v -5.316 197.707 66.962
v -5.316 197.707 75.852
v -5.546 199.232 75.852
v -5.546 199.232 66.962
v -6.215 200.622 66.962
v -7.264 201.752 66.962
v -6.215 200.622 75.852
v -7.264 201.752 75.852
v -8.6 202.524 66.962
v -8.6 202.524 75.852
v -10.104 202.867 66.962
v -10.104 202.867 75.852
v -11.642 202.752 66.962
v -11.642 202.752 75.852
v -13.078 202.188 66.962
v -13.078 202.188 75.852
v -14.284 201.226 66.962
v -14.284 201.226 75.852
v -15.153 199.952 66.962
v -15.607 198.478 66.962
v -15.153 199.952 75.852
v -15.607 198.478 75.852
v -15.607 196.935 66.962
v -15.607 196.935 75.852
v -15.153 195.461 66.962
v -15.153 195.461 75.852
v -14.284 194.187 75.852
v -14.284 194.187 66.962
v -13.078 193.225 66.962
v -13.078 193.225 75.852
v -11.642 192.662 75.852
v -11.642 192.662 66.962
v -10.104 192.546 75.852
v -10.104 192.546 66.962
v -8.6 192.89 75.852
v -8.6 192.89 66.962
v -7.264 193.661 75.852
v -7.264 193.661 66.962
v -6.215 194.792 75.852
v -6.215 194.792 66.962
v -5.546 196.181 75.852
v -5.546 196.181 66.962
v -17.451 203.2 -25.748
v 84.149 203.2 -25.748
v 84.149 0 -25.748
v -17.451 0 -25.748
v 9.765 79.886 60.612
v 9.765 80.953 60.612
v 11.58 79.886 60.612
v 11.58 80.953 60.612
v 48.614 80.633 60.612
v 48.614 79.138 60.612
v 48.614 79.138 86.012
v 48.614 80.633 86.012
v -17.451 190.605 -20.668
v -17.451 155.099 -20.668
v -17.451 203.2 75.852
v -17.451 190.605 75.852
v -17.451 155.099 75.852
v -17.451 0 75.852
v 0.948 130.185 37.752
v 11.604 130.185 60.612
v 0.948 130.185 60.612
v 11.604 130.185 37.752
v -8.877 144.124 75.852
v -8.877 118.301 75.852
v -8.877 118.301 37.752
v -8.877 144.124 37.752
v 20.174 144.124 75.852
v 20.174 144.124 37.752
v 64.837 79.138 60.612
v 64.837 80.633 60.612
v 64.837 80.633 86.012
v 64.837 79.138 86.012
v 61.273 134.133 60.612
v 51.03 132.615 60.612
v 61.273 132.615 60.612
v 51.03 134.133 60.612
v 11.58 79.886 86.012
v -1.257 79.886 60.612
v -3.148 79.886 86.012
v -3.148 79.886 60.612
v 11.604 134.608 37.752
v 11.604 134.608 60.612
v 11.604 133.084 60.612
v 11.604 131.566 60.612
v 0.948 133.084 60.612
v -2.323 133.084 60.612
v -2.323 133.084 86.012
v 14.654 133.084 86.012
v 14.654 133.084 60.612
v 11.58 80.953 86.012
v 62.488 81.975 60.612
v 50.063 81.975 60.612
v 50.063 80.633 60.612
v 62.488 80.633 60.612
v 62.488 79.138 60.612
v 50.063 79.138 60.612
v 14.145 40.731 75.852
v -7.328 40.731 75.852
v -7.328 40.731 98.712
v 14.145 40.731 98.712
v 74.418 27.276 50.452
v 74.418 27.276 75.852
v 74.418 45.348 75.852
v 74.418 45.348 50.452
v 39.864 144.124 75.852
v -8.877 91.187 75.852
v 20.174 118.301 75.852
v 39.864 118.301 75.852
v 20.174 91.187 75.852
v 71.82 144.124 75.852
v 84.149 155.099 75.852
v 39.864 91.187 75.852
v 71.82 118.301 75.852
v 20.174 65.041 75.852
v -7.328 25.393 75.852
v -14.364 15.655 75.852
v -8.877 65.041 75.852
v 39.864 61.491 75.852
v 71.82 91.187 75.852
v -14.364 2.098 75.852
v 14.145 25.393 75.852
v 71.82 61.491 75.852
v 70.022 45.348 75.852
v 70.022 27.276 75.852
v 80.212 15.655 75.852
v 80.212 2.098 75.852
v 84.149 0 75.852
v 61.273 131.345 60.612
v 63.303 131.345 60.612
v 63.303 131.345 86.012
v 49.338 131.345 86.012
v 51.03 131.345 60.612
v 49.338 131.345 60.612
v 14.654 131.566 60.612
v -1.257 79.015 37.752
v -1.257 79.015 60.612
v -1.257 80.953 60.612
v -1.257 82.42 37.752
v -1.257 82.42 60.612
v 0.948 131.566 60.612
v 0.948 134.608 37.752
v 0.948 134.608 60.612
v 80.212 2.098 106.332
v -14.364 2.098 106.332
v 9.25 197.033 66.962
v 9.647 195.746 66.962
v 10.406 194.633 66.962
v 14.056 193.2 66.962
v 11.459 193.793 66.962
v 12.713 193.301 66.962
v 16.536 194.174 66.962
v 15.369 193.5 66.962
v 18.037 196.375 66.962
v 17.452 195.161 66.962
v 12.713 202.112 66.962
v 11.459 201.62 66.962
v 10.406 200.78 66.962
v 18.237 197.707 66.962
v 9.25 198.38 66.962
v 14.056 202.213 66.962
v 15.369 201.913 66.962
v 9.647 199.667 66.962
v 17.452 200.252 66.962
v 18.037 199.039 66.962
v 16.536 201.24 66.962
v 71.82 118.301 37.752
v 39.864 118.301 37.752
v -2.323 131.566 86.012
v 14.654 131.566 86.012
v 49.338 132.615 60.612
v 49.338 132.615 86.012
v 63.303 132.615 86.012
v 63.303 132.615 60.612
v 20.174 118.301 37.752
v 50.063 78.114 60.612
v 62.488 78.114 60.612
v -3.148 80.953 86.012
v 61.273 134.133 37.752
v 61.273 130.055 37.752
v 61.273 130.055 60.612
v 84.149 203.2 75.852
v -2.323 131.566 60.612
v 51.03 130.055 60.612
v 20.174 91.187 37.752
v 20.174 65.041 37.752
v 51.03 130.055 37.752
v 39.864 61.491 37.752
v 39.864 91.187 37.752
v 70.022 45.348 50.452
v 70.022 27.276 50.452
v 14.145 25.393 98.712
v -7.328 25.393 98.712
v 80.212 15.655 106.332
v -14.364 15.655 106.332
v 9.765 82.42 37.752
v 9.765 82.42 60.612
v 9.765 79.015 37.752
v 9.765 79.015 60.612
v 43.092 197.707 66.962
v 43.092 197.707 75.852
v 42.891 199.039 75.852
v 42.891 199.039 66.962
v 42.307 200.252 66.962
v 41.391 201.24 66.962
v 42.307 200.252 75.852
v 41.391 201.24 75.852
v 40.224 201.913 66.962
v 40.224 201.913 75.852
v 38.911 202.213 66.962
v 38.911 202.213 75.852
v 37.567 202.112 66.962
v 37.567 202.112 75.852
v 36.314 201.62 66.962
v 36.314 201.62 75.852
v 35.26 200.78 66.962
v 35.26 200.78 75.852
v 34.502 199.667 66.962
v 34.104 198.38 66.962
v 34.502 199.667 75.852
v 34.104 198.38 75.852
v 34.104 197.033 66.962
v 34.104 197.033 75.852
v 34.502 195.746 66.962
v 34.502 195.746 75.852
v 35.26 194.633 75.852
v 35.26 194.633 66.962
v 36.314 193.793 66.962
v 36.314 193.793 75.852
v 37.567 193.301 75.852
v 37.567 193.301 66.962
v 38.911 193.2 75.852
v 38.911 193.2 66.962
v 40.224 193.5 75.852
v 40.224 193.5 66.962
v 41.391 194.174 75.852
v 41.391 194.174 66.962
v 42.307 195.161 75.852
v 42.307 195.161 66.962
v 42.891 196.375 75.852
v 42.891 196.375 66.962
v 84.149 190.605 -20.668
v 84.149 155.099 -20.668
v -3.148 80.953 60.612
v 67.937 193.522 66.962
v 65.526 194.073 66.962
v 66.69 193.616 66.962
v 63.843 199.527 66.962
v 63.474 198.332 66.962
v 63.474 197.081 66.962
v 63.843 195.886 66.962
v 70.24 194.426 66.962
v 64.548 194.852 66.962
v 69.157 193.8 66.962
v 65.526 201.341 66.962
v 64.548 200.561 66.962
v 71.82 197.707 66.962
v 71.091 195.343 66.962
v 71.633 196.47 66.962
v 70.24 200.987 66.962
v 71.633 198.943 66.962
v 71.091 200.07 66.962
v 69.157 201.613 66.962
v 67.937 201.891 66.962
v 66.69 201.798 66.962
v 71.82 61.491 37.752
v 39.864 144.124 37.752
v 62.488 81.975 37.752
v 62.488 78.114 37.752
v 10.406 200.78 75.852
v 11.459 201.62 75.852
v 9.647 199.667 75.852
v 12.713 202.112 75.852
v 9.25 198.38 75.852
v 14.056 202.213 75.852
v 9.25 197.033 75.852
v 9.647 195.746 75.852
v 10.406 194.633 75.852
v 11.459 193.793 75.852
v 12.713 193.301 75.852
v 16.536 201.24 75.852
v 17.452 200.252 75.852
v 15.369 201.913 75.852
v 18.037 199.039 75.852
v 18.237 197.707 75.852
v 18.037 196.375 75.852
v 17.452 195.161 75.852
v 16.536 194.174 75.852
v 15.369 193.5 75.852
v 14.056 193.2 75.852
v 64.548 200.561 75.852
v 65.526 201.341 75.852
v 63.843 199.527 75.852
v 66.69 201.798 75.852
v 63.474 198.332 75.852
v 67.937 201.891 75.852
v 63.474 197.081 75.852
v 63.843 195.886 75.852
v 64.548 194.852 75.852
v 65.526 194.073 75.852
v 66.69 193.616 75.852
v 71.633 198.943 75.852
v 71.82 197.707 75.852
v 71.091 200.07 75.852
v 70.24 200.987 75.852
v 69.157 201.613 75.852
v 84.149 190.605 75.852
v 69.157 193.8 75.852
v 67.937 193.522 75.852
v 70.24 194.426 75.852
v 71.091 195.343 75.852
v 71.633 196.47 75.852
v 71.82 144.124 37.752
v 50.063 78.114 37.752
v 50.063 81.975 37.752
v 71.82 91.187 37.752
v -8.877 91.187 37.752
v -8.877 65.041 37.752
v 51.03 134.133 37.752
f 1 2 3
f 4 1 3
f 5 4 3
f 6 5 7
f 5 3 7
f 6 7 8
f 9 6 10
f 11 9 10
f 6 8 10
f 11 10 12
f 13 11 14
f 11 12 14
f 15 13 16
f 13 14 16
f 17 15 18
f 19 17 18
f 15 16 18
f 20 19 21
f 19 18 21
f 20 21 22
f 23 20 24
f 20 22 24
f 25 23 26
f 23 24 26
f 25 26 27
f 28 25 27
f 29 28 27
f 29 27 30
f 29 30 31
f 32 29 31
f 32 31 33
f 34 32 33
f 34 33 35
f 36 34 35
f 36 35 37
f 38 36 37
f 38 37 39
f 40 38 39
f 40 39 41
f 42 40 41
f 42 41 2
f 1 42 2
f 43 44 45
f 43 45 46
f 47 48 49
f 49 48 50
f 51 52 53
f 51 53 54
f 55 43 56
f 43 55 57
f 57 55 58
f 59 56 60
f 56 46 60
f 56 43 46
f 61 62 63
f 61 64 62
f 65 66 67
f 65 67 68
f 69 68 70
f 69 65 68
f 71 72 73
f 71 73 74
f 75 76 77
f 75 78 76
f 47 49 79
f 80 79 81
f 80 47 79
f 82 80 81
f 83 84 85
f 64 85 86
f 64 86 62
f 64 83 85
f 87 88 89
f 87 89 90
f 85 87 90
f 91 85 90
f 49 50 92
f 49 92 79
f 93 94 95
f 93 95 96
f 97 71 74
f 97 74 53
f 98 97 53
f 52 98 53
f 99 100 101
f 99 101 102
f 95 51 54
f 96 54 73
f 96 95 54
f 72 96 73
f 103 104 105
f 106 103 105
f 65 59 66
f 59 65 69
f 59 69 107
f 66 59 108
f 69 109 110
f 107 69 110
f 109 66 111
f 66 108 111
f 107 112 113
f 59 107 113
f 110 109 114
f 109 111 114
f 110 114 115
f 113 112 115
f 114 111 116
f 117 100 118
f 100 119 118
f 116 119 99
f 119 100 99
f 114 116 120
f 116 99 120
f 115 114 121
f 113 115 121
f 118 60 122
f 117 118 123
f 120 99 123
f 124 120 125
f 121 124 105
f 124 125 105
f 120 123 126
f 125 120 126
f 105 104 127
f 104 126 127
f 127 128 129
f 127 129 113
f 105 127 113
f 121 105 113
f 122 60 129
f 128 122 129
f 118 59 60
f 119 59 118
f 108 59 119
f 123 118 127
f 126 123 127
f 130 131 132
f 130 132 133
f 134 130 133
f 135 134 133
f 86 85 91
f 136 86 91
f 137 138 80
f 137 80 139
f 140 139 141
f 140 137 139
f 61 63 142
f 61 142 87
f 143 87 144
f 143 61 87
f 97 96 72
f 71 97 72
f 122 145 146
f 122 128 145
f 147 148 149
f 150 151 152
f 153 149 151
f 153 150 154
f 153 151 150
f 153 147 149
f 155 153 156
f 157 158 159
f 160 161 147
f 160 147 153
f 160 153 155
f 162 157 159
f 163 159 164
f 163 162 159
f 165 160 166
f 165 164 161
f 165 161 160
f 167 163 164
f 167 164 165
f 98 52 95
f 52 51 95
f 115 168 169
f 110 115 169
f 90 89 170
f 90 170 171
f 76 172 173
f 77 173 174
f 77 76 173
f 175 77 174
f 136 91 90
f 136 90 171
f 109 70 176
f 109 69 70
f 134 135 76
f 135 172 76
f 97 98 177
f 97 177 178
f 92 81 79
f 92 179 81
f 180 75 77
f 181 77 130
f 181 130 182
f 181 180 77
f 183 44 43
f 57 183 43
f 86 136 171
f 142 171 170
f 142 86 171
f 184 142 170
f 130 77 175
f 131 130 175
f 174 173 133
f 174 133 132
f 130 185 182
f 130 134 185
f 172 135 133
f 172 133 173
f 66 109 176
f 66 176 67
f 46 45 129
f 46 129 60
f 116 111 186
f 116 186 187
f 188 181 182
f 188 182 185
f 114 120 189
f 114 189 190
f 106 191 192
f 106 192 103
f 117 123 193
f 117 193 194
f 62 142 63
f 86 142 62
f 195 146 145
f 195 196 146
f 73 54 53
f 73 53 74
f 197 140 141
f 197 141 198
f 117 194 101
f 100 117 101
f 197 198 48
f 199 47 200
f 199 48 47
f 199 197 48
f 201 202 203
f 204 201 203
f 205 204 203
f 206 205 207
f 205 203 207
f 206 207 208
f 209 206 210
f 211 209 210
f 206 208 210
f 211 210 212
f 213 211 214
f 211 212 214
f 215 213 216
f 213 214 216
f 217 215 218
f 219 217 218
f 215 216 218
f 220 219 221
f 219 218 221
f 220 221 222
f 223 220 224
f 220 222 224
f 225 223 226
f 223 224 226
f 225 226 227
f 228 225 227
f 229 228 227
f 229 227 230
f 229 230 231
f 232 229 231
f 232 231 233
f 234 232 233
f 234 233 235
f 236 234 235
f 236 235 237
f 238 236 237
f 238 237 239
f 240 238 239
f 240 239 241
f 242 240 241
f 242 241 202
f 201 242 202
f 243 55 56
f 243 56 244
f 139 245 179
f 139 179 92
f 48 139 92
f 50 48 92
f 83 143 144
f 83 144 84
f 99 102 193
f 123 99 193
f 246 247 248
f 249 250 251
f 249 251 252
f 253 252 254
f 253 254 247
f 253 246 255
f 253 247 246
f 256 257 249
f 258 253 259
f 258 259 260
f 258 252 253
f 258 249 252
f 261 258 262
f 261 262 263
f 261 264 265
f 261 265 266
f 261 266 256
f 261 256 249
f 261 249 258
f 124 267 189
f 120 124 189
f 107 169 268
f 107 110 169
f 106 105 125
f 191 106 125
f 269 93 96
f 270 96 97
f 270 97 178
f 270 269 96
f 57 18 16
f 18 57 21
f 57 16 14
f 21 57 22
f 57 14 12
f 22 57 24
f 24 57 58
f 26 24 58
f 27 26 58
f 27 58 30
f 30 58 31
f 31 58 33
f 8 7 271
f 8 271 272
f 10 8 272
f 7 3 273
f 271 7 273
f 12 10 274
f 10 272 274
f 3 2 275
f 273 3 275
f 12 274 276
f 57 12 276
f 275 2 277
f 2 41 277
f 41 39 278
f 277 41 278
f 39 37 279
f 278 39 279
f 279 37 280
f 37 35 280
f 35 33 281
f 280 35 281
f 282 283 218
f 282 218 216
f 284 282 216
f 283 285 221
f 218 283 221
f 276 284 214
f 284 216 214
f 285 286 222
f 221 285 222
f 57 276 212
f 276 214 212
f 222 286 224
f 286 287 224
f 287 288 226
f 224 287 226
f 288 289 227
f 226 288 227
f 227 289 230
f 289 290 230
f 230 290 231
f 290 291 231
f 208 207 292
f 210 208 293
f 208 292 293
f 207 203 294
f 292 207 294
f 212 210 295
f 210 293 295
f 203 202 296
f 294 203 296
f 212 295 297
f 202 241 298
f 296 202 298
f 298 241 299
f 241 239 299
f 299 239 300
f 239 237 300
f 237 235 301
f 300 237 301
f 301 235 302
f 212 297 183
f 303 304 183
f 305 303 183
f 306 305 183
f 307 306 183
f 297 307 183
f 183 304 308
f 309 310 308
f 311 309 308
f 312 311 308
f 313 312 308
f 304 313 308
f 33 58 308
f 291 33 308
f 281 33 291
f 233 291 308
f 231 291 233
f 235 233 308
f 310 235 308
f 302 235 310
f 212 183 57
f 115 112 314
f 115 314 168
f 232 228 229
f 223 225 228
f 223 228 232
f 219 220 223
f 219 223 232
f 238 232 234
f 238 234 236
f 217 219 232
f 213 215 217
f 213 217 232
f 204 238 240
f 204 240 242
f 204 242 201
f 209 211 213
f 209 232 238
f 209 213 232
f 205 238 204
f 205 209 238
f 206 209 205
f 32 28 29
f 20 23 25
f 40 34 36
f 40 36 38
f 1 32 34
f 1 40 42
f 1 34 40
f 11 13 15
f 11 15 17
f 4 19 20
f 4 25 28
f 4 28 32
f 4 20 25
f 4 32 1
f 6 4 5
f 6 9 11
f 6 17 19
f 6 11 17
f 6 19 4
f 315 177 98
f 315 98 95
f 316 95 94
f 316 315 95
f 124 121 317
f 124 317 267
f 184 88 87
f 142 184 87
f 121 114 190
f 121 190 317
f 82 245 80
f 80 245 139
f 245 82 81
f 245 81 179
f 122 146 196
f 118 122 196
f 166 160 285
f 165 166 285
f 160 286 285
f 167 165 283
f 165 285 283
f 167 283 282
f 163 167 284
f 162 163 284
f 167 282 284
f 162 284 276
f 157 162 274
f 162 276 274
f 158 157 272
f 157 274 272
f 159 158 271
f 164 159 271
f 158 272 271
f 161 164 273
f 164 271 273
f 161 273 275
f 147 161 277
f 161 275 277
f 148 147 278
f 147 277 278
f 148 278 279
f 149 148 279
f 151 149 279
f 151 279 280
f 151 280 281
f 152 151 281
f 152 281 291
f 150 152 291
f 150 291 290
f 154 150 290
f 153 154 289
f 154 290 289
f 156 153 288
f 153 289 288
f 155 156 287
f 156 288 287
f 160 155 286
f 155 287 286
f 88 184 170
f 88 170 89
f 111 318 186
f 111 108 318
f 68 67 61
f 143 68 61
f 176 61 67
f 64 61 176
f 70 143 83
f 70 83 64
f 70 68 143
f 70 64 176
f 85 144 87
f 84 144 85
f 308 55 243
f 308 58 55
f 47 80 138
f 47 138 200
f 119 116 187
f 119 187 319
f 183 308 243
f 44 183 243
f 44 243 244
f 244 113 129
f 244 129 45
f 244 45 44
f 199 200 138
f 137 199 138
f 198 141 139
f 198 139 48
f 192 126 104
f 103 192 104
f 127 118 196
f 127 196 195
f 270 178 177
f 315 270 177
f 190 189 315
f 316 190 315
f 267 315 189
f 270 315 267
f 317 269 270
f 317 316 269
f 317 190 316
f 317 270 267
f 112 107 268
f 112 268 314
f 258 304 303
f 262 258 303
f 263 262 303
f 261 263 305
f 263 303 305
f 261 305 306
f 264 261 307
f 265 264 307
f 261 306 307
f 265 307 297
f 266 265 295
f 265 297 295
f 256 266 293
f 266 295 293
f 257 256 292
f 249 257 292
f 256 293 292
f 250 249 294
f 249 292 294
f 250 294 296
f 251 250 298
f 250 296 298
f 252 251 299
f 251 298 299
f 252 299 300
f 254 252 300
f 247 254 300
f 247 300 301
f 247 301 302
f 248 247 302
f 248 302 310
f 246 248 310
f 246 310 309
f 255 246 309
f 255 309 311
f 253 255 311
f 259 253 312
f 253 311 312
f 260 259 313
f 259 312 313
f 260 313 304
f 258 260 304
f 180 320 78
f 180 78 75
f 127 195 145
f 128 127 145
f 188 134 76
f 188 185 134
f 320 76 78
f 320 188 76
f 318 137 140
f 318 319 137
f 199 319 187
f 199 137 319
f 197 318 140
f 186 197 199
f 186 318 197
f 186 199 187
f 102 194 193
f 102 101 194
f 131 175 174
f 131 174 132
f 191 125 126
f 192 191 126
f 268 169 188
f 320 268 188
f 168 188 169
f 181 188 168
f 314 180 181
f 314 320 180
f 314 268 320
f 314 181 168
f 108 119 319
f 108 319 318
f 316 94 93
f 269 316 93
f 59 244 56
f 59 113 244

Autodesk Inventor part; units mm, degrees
ref_plane "YZ Plane" through (0, 0, 0) normal (1, 0, 0) x (0, 1, 0)
ref_plane "XZ Plane" through (0, 0, 0) normal (0, 1, 0) x (-1, 0, 0)
ref_plane "XY Plane" through (0, 0, 0) normal (0, 0, 1) x (1, 0, 0)
sketch "Sketch1" plane through (0, 0, 0) normal (0, 1, 0) x (-1, 0, 0)
  line L0 (17.4506, 75.8516) -> (-84.1494, 75.8516)
  line L1 (-84.1494, 75.8516) -> (-84.1494, -25.7484)
  line L2 (-84.1494, -25.7484) -> (17.4506, -25.7484)
  line L3 (17.4506, -25.7484) -> (17.4506, 75.8516)
  point P0 (0, 0)
  dimension "d0" = 101.6
  dimension "d1" = 101.6
extrude "Extrusion1" add sketch "Sketch1" along normal blind 203.2
sketch "Sketch2" plane through (-17.4506, 0, 75.8516) normal (0, 0, 1) x (1, 0, 0)
  line L0 (0, 0) -> (0, 203.2) projected
  line L1 (101.6, 0) -> (101.6, 203.2) projected
  line L2 (0, 190.6053) -> (101.6, 190.6053)
  line L3 (101.6, 190.6053) -> (101.6, 155.0988)
  line L4 (101.6, 155.0988) -> (0, 155.0988)
  line L5 (0, 155.0988) -> (0, 190.6053)
  point P0 (17.4506, 0)
  point P1 (0, 155.0988)
  point P2 (101.6, 190.6053)
extrude "Extrusion2" cut sketch "Sketch2" against normal blind 96.52
sketch "Sketch3" plane through (-17.4506, 203.2, 75.8516) normal (0, 0, 1) x (1, 0, 0)
  circle A0 centre (6.9601, -5.4934) radius 5.1747
  circle A1 centre (31.169, -5.4934) radius 4.519
  circle A2 centre (56.0236, -5.4934) radius 4.519
  circle A3 centre (85.0743, -5.4934) radius 4.1962
  point P0 (17.4506, -203.2)
extrude "Extrusion3" cut sketch "Sketch3" against normal blind 8.89
sketch "Sketch4" plane through (-17.4506, 0, 75.8516) normal (0, 0, 1) x (1, 0, 0)
  line L0 (8.574, 144.124) -> (37.6248, 144.124)
  line L1 (37.6248, 144.124) -> (37.6248, 118.3011)
  line L2 (37.6248, 118.3011) -> (8.574, 118.3011)
  line L3 (8.574, 118.3011) -> (8.574, 144.124)
  line L4 (57.3147, 144.124) -> (89.2705, 144.124)
  line L5 (89.2705, 144.124) -> (89.2705, 118.3011)
  line L6 (89.2705, 118.3011) -> (57.3147, 118.3011)
  line L7 (57.3147, 118.3011) -> (57.3147, 144.124)
  line L8 (8.574, 91.1871) -> (37.6248, 91.1871)
  line L9 (37.6248, 91.1871) -> (37.6248, 65.0414)
  line L10 (37.6248, 65.0414) -> (8.574, 65.0414)
  line L11 (8.574, 65.0414) -> (8.574, 91.1871)
  line L12 (57.3147, 91.1871) -> (89.2705, 91.1871)
  line L13 (89.2705, 91.1871) -> (89.2705, 61.4908)
  line L14 (89.2705, 61.4908) -> (57.3147, 61.4908)
  line L15 (57.3147, 61.4908) -> (57.3147, 91.1871)
  point P0 (17.4506, 0)
extrude "Extrusion4" cut sketch "Sketch4" against normal blind 38.1
sketch "Sketch5" plane through (-17.4506, 0, 75.8516) normal (0, 0, 1) x (1, 0, 0)
  line L0 (87.4727, 45.3482) -> (87.4727, 27.2761)
  line L1 (87.4727, 27.2761) -> (91.8686, 27.2761)
  line L2 (91.8686, 27.2761) -> (91.8686, 45.3482)
  line L3 (91.8686, 45.3482) -> (87.4727, 45.3482)
  point P0 (17.4506, 0)
extrude "Extrusion5" cut sketch "Sketch5" against normal blind 25.4
sketch "Sketch6" plane through (-17.4506, 0, 75.8516) normal (0, 0, 1) x (1, 0, 0)
  line L0 (3.0866, 15.6551) -> (97.663, 15.6551)
  line L1 (97.663, 15.6551) -> (97.663, 2.0981)
  line L2 (97.663, 2.0981) -> (3.0866, 2.0981)
  line L3 (3.0866, 2.0981) -> (3.0866, 15.6551)
  point P0 (17.4506, 0)
extrude "Extrusion6" add sketch "Sketch6" along normal blind 30.48
sketch "Sketch7" plane through (-17.4506, 0, 75.8516) normal (0, 0, 1) x (1, 0, 0)
  line L0 (10.1224, 40.7313) -> (31.5958, 40.7313)
  line L1 (31.5958, 40.7313) -> (31.5958, 25.3932)
  line L2 (31.5958, 25.3932) -> (10.1224, 25.3932)
  line L3 (10.1224, 25.3932) -> (10.1224, 40.7313)
  point P0 (17.4506, 0)
extrude "Extrusion7" add sketch "Sketch7" along normal blind 22.86
sketch "Sketch8" plane through (-17.4506, 0, 37.7516) normal (0, 0, 1) x (1, 0, 0)
  line L0 (18.3983, 134.6076) -> (29.055, 134.6076)
  line L1 (29.055, 134.6076) -> (29.055, 130.1851)
  line L2 (29.055, 130.1851) -> (18.3983, 130.1851)
  line L3 (18.3983, 130.1851) -> (18.3983, 134.6076)
  point P0 (17.4506, 0)
extrude "Extrusion8" add sketch "Sketch8" along normal blind 22.86
sketch "Sketch9" plane through (-17.4506, 0, 37.7516) normal (0, 0, 1) x (1, 0, 0)
  line L0 (68.4801, 134.1332) -> (78.7235, 134.1332)
  line L1 (78.7235, 134.1332) -> (78.7235, 130.0548)
  line L2 (78.7235, 130.0548) -> (68.4801, 130.0548)
  line L3 (68.4801, 130.0548) -> (68.4801, 134.1332)
  point P0 (17.4506, 0)
extrude "Extrusion9" add sketch "Sketch9" along normal blind 22.86
sketch "Sketch10" plane through (-17.4506, 0, 37.7516) normal (0, 0, 1) x (1, 0, 0)
  line L0 (16.1934, 82.4203) -> (27.2154, 82.4203)
  line L1 (27.2154, 82.4203) -> (27.2154, 79.0146)
  line L2 (27.2154, 79.0146) -> (16.1934, 79.0146)
  line L3 (16.1934, 79.0146) -> (16.1934, 82.4203)
  point P0 (17.4506, 0)
extrude "Extrusion10" add sketch "Sketch10" along normal blind 22.86
sketch "Sketch11" plane through (-17.4506, 0, 37.7516) normal (0, 0, 1) x (1, 0, 0)
  line L0 (67.5137, 81.9751) -> (79.9385, 81.9751)
  line L1 (79.9385, 81.9751) -> (79.9385, 78.1143)
  line L2 (79.9385, 78.1143) -> (67.5137, 78.1143)
  line L3 (67.5137, 78.1143) -> (67.5137, 81.9751)
  point P0 (17.4506, 0)
extrude "Extrusion11" add sketch "Sketch11" along normal blind 22.86
sketch "Sketch12" plane through (-17.4506, 0, 60.6116) normal (0, 0, 1) x (1, 0, 0)
  line L0 (15.1277, 133.0839) -> (32.1051, 133.0839)
  line L1 (32.1051, 133.0839) -> (32.1051, 131.5664)
  line L2 (32.1051, 131.5664) -> (15.1277, 131.5664)
  line L3 (15.1277, 131.5664) -> (15.1277, 133.0839)
  point P0 (17.4506, 0)
extrude "Extrusion12" add sketch "Sketch12" along normal blind 25.4
sketch "Sketch13" plane through (-17.4506, 0, 60.6116) normal (0, 0, 1) x (1, 0, 0)
  line L0 (66.7886, 132.615) -> (80.7539, 132.615)
  line L1 (80.7539, 132.615) -> (80.7539, 131.3454)
  line L2 (80.7539, 131.3454) -> (66.7886, 131.3454)
  line L3 (66.7886, 131.3454) -> (66.7886, 132.615)
  point P0 (17.4506, 0)
extrude "Extrusion13" add sketch "Sketch13" along normal blind 25.4
sketch "Sketch14" plane through (-17.4506, 0, 60.6116) normal (0, 0, 1) x (1, 0, 0)
  line L0 (14.3022, 80.9529) -> (29.0306, 80.9529)
  line L1 (29.0306, 80.9529) -> (29.0306, 79.8856)
  line L2 (29.0306, 79.8856) -> (14.3022, 79.8856)
  line L3 (14.3022, 79.8856) -> (14.3022, 80.9529)
  point P0 (17.4506, 0)
extrude "Extrusion14" add sketch "Sketch14" along normal blind 25.4
sketch "Sketch15" plane through (-17.4506, 0, 60.6116) normal (0, 0, 1) x (1, 0, 0)
  line L0 (66.065, 80.6327) -> (82.2876, 80.6327)
  line L1 (82.2876, 80.6327) -> (82.2876, 79.1385)
  line L2 (82.2876, 79.1385) -> (66.065, 79.1385)
  line L3 (66.065, 79.1385) -> (66.065, 80.6327)
  point P0 (17.4506, 0)
extrude "Extrusion15" add sketch "Sketch15" along normal blind 25.4
sketch "Sketch16" plane through (-17.4506, 155.0988, 75.8516) normal (0, 1, 0) x (1, 0, 0)
  point P0 (17.4506, 75.8516)
properties part number "fff"
